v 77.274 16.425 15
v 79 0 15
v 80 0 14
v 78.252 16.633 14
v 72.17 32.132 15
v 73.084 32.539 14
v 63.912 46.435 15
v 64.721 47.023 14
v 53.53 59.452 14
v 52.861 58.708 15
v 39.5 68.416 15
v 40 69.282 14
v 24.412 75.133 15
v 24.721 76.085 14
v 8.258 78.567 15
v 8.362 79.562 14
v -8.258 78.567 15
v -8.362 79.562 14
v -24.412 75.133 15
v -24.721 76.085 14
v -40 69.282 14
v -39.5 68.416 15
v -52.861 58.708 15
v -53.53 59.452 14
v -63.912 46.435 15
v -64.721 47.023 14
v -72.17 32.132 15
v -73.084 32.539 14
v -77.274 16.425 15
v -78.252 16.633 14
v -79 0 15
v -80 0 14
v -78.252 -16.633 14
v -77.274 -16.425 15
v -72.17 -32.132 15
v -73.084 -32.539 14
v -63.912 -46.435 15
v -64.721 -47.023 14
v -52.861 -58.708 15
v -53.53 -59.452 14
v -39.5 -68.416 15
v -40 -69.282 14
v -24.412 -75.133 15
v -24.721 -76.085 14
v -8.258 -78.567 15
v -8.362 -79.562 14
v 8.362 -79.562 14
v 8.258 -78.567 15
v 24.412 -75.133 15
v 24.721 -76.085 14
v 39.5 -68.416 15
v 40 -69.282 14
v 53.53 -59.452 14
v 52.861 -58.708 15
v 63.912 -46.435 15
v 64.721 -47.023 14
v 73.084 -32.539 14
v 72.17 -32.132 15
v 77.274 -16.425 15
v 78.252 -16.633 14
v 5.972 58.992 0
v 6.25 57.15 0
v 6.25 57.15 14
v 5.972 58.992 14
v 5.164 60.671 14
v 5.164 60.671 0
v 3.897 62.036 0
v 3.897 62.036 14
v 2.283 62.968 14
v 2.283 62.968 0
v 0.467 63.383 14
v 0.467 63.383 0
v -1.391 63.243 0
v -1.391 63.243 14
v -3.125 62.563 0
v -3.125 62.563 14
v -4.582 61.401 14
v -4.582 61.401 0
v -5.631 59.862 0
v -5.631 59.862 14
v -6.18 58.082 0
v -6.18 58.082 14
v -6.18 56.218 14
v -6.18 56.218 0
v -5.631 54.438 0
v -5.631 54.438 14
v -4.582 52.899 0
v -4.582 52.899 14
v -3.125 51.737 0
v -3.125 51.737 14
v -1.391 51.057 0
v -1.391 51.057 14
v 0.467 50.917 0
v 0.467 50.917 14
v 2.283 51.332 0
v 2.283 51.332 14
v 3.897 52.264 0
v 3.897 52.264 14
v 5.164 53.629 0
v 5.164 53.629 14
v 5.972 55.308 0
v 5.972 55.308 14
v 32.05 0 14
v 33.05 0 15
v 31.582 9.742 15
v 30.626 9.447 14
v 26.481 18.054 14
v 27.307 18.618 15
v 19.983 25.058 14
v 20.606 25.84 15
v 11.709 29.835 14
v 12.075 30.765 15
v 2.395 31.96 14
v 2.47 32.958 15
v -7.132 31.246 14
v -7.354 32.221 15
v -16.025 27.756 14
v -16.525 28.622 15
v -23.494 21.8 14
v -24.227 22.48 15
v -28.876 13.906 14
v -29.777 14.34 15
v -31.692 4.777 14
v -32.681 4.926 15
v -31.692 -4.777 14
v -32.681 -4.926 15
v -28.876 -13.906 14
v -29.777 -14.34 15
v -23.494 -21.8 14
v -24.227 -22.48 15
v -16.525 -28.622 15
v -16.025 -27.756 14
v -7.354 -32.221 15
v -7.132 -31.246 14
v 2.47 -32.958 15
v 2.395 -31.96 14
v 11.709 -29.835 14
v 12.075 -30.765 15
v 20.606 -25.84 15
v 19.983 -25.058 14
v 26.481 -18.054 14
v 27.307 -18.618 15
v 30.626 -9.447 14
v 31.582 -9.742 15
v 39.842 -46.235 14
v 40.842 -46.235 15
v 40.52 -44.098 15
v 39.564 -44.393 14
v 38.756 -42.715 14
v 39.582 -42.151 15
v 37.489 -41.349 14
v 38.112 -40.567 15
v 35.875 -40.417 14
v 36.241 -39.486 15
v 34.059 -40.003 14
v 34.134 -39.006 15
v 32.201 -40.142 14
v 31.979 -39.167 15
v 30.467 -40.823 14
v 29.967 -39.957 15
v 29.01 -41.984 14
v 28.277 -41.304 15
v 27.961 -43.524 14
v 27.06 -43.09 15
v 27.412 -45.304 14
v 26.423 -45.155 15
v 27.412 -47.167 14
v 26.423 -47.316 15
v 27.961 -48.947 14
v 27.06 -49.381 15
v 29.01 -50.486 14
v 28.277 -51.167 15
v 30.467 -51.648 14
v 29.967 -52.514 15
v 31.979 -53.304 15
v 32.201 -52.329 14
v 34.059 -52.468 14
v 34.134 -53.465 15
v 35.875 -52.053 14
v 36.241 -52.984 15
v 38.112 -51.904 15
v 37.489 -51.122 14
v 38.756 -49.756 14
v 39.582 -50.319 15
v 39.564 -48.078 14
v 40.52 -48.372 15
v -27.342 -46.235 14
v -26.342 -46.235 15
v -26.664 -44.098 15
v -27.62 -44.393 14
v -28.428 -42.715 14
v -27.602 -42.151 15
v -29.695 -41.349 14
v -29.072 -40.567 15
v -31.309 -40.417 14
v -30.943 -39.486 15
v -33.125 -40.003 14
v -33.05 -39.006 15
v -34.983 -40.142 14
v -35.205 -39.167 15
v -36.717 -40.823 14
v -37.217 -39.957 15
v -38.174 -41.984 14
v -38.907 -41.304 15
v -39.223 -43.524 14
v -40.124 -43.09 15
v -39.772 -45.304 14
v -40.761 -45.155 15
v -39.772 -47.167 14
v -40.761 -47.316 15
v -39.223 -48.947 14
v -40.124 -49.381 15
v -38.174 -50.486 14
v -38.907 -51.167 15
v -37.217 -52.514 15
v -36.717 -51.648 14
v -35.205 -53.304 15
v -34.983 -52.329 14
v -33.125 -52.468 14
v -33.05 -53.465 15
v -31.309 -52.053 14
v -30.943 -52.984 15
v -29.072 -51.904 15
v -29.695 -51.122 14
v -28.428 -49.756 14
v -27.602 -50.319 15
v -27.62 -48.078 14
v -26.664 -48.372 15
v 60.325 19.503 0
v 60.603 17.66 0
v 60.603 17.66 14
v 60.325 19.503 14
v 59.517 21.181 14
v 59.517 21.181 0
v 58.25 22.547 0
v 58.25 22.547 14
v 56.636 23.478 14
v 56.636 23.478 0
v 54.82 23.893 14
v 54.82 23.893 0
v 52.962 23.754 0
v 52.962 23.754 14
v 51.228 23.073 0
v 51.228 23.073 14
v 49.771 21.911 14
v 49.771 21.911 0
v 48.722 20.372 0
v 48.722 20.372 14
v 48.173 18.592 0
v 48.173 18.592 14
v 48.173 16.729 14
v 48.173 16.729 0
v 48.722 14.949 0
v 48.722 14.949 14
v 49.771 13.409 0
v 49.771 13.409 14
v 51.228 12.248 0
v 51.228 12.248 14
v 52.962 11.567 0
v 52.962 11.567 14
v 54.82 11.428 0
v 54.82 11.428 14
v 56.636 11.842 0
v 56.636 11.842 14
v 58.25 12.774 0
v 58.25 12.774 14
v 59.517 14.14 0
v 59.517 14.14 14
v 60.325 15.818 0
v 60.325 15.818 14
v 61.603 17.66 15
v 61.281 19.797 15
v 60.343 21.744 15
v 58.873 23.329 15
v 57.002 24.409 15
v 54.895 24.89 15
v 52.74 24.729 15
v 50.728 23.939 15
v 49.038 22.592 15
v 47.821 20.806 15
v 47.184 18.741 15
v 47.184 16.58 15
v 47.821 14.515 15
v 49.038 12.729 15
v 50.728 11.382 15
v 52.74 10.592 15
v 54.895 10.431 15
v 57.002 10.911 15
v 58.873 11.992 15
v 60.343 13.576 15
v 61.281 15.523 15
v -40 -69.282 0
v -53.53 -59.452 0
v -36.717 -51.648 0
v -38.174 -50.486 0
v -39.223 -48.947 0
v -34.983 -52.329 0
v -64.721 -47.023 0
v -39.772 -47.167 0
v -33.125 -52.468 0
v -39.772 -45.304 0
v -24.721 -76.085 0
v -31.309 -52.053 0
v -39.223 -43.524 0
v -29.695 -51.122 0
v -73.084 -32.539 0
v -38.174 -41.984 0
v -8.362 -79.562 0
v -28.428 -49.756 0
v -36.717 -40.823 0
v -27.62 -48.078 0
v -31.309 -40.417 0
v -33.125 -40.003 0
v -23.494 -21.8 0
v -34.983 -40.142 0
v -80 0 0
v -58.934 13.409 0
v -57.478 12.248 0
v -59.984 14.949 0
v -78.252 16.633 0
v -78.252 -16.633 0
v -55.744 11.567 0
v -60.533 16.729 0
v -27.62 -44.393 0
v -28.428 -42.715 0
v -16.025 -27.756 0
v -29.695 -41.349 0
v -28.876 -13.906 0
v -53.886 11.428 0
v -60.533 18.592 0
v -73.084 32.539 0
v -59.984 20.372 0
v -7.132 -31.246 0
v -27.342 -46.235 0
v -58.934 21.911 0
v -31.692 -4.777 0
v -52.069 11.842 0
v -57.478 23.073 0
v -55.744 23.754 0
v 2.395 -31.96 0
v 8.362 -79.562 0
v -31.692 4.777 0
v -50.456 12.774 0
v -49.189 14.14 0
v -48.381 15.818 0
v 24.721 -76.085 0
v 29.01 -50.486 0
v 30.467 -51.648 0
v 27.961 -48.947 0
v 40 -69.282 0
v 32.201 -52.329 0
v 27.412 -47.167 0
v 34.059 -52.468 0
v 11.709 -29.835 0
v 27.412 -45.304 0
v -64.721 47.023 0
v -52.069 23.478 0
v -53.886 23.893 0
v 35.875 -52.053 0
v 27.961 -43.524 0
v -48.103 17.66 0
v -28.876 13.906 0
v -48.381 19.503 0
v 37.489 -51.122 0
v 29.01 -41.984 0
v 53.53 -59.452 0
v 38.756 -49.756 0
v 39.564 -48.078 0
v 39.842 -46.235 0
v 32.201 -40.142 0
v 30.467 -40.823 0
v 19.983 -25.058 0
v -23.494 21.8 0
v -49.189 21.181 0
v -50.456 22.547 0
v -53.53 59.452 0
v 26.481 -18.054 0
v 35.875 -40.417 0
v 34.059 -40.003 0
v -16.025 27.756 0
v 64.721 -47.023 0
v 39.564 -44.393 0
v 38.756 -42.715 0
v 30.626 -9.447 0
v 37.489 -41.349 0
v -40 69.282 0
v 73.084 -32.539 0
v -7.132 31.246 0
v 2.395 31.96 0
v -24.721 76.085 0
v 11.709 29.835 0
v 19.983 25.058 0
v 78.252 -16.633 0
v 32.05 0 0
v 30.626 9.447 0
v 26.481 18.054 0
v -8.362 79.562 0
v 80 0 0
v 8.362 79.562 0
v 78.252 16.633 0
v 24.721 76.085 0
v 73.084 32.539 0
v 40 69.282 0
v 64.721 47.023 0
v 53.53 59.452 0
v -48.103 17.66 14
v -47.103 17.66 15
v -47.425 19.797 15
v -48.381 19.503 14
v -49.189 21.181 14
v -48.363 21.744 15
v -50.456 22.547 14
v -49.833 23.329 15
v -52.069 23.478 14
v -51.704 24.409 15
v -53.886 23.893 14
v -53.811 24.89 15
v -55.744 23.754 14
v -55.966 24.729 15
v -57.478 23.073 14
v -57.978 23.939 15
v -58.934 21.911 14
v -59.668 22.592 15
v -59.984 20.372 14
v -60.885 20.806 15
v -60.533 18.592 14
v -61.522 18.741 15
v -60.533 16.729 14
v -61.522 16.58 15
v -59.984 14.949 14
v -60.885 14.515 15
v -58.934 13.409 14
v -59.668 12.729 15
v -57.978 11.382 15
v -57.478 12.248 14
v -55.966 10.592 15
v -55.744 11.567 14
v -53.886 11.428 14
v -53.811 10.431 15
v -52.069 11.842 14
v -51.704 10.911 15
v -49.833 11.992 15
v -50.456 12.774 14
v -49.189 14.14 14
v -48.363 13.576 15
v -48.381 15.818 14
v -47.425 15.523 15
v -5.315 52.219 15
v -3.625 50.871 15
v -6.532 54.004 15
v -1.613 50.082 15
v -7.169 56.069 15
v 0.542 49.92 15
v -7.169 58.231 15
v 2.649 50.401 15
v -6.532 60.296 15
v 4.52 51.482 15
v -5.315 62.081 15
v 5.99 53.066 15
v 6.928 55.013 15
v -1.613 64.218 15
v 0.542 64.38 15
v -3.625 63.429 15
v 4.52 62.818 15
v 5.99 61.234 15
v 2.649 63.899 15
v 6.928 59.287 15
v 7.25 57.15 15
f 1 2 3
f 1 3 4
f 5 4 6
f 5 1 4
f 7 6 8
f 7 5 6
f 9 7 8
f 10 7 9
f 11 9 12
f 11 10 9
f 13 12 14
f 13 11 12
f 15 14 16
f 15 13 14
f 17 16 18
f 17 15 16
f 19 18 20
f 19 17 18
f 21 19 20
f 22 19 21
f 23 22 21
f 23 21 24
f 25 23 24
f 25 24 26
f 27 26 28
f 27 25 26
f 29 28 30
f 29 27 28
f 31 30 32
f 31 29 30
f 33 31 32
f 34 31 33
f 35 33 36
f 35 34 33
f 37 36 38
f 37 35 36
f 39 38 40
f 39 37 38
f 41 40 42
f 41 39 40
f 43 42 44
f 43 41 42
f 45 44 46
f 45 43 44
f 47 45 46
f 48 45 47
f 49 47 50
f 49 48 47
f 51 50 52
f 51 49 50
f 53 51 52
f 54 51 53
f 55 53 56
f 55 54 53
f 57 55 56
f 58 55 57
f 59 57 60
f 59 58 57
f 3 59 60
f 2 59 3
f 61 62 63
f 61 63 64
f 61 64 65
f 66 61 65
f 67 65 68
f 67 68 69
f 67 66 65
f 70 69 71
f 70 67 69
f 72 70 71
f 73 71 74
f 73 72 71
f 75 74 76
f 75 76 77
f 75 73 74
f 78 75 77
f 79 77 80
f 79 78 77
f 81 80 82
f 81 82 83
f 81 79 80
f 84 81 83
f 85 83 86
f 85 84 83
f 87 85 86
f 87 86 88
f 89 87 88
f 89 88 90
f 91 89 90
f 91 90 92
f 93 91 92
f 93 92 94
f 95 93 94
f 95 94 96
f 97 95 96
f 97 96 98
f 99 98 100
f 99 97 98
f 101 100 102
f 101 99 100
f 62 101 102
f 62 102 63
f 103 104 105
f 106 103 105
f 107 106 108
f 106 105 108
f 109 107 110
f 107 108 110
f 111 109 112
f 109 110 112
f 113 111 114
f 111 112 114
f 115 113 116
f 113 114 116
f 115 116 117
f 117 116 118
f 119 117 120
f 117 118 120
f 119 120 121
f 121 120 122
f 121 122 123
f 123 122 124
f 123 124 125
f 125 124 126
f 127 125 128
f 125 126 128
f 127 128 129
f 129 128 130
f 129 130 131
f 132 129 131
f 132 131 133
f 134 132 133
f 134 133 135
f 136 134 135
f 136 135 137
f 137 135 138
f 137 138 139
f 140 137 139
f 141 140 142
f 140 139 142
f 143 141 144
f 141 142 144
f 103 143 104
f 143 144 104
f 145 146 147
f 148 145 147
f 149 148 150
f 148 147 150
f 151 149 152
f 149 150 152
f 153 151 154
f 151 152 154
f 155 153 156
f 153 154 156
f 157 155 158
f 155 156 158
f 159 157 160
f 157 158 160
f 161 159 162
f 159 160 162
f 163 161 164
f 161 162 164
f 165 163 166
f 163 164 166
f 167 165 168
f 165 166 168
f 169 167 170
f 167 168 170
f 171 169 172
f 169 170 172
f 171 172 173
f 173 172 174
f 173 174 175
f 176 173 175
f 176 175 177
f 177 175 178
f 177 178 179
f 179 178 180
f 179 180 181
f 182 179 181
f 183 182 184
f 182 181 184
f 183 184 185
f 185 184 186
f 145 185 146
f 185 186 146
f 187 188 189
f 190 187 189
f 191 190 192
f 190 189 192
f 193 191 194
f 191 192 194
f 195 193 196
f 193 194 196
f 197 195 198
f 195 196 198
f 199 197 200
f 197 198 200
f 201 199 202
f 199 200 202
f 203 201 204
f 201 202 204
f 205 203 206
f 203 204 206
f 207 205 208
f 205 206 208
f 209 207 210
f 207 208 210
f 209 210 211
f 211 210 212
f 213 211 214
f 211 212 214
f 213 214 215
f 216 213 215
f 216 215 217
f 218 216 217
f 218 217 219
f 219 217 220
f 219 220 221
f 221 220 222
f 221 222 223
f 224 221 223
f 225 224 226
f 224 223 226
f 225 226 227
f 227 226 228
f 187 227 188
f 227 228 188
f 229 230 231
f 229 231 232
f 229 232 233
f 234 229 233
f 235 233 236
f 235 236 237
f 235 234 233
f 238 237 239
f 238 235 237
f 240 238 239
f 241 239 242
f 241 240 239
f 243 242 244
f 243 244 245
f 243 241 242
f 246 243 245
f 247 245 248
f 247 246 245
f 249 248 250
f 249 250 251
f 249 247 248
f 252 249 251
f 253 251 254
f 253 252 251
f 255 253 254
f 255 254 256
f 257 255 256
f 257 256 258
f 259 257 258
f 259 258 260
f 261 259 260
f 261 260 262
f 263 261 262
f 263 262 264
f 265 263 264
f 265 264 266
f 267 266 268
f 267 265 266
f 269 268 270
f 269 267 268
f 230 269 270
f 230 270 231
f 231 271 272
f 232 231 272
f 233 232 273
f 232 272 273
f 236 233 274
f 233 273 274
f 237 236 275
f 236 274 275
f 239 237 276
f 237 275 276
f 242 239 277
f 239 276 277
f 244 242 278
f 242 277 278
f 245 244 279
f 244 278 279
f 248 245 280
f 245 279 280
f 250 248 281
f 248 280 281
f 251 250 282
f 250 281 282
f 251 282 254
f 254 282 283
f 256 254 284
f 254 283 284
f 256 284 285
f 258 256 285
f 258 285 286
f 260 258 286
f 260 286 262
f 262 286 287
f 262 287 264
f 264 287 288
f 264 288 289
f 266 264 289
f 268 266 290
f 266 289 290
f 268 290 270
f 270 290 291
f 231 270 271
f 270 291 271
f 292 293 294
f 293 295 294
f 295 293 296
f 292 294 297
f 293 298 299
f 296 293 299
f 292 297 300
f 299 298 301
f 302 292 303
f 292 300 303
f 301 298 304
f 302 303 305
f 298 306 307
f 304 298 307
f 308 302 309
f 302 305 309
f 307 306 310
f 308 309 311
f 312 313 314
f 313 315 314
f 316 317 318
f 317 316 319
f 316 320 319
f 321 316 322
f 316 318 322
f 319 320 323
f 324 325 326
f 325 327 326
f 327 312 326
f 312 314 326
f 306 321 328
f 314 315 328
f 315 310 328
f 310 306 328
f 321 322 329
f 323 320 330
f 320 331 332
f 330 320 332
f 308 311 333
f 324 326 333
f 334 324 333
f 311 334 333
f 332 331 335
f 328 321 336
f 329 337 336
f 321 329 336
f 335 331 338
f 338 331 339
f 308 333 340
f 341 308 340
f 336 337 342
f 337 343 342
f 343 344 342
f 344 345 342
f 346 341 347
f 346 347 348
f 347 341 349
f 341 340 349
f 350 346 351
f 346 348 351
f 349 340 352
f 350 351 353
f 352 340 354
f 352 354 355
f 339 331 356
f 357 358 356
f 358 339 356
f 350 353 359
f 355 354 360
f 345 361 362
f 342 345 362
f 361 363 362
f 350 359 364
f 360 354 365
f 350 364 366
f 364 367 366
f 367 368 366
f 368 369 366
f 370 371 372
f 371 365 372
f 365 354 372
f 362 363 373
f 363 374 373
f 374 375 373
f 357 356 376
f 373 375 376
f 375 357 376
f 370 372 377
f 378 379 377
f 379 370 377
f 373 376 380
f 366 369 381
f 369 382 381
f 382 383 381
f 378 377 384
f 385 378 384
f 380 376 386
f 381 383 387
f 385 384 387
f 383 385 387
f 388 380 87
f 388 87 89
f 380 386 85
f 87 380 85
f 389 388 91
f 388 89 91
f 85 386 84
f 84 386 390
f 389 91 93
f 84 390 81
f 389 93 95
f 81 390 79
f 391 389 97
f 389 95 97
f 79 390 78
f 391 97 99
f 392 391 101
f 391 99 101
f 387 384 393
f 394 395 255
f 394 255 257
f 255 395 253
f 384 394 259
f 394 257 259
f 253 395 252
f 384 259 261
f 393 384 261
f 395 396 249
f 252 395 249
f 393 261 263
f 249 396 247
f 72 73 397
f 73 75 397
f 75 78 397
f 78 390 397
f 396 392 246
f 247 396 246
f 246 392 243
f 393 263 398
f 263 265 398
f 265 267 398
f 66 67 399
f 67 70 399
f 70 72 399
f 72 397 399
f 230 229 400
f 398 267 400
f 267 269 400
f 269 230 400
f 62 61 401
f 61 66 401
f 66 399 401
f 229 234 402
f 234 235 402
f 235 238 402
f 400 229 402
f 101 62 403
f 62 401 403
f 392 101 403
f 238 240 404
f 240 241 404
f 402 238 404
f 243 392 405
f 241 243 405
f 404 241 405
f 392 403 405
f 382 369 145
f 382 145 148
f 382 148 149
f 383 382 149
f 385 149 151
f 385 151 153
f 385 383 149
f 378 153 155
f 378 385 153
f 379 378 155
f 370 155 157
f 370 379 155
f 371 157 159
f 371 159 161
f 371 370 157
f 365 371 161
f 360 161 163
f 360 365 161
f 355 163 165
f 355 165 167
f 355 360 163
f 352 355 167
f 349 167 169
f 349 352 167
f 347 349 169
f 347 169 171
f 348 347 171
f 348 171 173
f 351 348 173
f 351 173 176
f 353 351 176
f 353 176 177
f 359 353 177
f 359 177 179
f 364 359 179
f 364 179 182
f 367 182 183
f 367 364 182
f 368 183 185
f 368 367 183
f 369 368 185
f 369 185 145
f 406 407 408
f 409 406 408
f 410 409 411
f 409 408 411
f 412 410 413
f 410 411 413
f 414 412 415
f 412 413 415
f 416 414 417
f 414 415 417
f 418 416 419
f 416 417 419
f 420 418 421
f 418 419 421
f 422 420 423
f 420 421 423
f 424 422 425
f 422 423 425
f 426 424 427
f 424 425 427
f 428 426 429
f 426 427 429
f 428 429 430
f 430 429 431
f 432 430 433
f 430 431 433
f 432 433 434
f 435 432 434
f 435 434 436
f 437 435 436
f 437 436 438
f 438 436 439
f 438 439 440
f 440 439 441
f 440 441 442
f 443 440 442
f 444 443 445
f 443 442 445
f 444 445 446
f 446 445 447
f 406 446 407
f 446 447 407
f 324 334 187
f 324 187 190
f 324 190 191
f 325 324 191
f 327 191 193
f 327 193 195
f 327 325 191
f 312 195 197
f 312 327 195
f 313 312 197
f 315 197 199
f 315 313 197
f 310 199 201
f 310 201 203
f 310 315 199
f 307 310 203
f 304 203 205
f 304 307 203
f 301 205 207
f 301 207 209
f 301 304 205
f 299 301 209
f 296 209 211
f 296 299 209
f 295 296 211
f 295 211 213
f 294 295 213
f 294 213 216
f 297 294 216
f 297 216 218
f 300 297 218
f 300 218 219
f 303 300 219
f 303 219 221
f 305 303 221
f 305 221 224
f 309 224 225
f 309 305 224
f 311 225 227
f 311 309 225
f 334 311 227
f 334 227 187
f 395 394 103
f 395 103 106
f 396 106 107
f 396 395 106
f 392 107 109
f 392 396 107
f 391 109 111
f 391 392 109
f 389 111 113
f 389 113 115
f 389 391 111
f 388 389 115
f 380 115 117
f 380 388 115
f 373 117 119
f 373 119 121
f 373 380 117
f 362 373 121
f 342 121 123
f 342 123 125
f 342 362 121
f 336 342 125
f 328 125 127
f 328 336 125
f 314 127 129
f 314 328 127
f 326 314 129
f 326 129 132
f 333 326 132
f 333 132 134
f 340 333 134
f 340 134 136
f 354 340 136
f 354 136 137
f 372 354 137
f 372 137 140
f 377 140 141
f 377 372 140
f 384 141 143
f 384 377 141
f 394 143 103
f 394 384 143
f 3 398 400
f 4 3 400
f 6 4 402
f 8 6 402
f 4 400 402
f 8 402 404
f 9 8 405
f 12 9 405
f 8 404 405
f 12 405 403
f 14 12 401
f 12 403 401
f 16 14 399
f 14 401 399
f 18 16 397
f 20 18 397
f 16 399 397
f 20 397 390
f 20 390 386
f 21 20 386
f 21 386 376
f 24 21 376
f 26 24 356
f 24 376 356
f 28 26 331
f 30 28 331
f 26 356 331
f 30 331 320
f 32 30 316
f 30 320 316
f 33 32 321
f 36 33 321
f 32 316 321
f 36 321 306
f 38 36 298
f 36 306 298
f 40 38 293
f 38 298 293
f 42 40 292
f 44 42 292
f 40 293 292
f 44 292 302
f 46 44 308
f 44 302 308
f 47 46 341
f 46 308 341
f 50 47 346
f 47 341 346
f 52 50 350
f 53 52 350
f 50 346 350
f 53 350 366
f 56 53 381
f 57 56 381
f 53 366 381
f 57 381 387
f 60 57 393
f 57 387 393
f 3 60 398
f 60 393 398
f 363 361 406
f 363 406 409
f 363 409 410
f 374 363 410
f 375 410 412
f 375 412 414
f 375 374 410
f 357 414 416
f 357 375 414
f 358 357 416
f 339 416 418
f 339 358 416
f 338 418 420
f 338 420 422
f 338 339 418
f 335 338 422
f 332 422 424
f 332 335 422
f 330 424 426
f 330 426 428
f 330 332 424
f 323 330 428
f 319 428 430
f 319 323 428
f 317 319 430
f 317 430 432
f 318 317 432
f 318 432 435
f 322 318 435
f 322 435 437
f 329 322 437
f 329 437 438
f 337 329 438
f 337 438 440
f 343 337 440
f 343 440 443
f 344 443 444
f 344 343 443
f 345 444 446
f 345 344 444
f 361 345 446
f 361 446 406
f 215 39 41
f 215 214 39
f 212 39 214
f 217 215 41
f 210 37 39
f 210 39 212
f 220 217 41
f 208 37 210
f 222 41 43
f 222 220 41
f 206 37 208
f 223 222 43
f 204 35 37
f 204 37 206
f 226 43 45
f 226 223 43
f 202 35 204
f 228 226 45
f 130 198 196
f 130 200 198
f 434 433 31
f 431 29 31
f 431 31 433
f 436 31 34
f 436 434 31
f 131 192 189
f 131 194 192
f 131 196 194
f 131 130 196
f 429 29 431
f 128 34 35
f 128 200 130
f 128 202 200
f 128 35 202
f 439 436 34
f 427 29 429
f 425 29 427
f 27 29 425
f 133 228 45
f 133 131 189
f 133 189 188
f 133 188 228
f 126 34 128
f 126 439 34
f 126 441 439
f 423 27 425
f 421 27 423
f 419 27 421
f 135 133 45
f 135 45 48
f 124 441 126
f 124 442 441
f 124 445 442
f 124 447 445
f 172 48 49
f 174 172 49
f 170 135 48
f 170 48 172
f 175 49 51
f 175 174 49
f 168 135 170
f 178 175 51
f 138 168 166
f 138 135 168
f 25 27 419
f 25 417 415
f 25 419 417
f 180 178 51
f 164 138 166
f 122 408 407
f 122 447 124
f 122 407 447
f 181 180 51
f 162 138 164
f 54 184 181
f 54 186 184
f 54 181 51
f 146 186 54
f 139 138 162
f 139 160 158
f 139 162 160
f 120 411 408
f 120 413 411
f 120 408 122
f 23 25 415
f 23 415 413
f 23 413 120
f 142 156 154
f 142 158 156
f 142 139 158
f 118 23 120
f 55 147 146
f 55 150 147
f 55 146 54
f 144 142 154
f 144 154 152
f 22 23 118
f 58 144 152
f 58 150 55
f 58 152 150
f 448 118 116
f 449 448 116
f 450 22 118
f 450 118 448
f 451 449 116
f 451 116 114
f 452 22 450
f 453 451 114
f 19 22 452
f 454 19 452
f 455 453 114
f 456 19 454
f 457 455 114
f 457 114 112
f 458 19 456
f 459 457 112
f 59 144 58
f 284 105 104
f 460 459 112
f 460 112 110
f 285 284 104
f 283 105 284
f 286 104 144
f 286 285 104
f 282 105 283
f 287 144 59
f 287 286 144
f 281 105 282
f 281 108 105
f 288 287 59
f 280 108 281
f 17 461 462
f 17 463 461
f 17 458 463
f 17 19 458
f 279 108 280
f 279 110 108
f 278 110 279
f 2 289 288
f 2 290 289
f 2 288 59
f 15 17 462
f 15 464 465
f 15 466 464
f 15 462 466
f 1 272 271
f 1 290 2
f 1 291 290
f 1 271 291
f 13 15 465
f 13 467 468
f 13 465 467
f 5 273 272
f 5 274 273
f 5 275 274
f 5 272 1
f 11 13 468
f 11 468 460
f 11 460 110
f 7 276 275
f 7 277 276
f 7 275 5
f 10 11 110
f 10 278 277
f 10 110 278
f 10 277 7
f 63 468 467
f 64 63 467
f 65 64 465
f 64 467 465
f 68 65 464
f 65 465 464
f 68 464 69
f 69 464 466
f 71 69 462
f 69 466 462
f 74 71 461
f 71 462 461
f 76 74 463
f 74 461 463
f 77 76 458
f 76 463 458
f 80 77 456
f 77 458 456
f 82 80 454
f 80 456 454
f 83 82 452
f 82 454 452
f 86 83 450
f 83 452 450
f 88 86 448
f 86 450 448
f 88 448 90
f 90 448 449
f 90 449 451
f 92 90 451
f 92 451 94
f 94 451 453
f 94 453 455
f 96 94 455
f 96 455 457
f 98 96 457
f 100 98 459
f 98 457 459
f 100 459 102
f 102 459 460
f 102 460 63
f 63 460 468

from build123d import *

# Parameters (mm, degrees)
F0_R     = 80
F0_R_2   = 6.25
F0_R_3   = 32.05
F1_DEPTH = 15
F2_SIZE  = 1


with BuildPart() as f1:
    # F0 (on Top) → F1 (new body)
    with BuildSketch(Plane.XY):
        Circle(F0_R)
        with Locations((-33.591927, -46.235321)):
            Circle(F0_R_2, mode=Mode.SUBTRACT)
        with Locations((33.591927, -46.235321)):
            Circle(F0_R_2, mode=Mode.SUBTRACT)
        with Locations((-54.35288, 17.660321)):
            Circle(F0_R_2, mode=Mode.SUBTRACT)
        Circle(F0_R_3, mode=Mode.SUBTRACT)
        with Locations((54.35288, 17.660321)):
            Circle(F0_R_2, mode=Mode.SUBTRACT)
        with Locations((0, 57.15)):
            Circle(F0_R_2, mode=Mode.SUBTRACT)
    extrude(amount=F1_DEPTH)

    # F2
    f2_edges = [f1.edges().sort_by_distance(p)[0] for p in [
        (-80, 0, 15),
        (-39.841927, -46.235321, 15),
        (27.341927, -46.235321, 15),
        (-60.60288, 17.660321, 15),
        (-32.05, 0, 15),
        (48.10288, 17.660321, 15),
        (-6.25, 57.15, 15),
    ]]
    chamfer(f2_edges, length=F2_SIZE)


solid = f1.part
